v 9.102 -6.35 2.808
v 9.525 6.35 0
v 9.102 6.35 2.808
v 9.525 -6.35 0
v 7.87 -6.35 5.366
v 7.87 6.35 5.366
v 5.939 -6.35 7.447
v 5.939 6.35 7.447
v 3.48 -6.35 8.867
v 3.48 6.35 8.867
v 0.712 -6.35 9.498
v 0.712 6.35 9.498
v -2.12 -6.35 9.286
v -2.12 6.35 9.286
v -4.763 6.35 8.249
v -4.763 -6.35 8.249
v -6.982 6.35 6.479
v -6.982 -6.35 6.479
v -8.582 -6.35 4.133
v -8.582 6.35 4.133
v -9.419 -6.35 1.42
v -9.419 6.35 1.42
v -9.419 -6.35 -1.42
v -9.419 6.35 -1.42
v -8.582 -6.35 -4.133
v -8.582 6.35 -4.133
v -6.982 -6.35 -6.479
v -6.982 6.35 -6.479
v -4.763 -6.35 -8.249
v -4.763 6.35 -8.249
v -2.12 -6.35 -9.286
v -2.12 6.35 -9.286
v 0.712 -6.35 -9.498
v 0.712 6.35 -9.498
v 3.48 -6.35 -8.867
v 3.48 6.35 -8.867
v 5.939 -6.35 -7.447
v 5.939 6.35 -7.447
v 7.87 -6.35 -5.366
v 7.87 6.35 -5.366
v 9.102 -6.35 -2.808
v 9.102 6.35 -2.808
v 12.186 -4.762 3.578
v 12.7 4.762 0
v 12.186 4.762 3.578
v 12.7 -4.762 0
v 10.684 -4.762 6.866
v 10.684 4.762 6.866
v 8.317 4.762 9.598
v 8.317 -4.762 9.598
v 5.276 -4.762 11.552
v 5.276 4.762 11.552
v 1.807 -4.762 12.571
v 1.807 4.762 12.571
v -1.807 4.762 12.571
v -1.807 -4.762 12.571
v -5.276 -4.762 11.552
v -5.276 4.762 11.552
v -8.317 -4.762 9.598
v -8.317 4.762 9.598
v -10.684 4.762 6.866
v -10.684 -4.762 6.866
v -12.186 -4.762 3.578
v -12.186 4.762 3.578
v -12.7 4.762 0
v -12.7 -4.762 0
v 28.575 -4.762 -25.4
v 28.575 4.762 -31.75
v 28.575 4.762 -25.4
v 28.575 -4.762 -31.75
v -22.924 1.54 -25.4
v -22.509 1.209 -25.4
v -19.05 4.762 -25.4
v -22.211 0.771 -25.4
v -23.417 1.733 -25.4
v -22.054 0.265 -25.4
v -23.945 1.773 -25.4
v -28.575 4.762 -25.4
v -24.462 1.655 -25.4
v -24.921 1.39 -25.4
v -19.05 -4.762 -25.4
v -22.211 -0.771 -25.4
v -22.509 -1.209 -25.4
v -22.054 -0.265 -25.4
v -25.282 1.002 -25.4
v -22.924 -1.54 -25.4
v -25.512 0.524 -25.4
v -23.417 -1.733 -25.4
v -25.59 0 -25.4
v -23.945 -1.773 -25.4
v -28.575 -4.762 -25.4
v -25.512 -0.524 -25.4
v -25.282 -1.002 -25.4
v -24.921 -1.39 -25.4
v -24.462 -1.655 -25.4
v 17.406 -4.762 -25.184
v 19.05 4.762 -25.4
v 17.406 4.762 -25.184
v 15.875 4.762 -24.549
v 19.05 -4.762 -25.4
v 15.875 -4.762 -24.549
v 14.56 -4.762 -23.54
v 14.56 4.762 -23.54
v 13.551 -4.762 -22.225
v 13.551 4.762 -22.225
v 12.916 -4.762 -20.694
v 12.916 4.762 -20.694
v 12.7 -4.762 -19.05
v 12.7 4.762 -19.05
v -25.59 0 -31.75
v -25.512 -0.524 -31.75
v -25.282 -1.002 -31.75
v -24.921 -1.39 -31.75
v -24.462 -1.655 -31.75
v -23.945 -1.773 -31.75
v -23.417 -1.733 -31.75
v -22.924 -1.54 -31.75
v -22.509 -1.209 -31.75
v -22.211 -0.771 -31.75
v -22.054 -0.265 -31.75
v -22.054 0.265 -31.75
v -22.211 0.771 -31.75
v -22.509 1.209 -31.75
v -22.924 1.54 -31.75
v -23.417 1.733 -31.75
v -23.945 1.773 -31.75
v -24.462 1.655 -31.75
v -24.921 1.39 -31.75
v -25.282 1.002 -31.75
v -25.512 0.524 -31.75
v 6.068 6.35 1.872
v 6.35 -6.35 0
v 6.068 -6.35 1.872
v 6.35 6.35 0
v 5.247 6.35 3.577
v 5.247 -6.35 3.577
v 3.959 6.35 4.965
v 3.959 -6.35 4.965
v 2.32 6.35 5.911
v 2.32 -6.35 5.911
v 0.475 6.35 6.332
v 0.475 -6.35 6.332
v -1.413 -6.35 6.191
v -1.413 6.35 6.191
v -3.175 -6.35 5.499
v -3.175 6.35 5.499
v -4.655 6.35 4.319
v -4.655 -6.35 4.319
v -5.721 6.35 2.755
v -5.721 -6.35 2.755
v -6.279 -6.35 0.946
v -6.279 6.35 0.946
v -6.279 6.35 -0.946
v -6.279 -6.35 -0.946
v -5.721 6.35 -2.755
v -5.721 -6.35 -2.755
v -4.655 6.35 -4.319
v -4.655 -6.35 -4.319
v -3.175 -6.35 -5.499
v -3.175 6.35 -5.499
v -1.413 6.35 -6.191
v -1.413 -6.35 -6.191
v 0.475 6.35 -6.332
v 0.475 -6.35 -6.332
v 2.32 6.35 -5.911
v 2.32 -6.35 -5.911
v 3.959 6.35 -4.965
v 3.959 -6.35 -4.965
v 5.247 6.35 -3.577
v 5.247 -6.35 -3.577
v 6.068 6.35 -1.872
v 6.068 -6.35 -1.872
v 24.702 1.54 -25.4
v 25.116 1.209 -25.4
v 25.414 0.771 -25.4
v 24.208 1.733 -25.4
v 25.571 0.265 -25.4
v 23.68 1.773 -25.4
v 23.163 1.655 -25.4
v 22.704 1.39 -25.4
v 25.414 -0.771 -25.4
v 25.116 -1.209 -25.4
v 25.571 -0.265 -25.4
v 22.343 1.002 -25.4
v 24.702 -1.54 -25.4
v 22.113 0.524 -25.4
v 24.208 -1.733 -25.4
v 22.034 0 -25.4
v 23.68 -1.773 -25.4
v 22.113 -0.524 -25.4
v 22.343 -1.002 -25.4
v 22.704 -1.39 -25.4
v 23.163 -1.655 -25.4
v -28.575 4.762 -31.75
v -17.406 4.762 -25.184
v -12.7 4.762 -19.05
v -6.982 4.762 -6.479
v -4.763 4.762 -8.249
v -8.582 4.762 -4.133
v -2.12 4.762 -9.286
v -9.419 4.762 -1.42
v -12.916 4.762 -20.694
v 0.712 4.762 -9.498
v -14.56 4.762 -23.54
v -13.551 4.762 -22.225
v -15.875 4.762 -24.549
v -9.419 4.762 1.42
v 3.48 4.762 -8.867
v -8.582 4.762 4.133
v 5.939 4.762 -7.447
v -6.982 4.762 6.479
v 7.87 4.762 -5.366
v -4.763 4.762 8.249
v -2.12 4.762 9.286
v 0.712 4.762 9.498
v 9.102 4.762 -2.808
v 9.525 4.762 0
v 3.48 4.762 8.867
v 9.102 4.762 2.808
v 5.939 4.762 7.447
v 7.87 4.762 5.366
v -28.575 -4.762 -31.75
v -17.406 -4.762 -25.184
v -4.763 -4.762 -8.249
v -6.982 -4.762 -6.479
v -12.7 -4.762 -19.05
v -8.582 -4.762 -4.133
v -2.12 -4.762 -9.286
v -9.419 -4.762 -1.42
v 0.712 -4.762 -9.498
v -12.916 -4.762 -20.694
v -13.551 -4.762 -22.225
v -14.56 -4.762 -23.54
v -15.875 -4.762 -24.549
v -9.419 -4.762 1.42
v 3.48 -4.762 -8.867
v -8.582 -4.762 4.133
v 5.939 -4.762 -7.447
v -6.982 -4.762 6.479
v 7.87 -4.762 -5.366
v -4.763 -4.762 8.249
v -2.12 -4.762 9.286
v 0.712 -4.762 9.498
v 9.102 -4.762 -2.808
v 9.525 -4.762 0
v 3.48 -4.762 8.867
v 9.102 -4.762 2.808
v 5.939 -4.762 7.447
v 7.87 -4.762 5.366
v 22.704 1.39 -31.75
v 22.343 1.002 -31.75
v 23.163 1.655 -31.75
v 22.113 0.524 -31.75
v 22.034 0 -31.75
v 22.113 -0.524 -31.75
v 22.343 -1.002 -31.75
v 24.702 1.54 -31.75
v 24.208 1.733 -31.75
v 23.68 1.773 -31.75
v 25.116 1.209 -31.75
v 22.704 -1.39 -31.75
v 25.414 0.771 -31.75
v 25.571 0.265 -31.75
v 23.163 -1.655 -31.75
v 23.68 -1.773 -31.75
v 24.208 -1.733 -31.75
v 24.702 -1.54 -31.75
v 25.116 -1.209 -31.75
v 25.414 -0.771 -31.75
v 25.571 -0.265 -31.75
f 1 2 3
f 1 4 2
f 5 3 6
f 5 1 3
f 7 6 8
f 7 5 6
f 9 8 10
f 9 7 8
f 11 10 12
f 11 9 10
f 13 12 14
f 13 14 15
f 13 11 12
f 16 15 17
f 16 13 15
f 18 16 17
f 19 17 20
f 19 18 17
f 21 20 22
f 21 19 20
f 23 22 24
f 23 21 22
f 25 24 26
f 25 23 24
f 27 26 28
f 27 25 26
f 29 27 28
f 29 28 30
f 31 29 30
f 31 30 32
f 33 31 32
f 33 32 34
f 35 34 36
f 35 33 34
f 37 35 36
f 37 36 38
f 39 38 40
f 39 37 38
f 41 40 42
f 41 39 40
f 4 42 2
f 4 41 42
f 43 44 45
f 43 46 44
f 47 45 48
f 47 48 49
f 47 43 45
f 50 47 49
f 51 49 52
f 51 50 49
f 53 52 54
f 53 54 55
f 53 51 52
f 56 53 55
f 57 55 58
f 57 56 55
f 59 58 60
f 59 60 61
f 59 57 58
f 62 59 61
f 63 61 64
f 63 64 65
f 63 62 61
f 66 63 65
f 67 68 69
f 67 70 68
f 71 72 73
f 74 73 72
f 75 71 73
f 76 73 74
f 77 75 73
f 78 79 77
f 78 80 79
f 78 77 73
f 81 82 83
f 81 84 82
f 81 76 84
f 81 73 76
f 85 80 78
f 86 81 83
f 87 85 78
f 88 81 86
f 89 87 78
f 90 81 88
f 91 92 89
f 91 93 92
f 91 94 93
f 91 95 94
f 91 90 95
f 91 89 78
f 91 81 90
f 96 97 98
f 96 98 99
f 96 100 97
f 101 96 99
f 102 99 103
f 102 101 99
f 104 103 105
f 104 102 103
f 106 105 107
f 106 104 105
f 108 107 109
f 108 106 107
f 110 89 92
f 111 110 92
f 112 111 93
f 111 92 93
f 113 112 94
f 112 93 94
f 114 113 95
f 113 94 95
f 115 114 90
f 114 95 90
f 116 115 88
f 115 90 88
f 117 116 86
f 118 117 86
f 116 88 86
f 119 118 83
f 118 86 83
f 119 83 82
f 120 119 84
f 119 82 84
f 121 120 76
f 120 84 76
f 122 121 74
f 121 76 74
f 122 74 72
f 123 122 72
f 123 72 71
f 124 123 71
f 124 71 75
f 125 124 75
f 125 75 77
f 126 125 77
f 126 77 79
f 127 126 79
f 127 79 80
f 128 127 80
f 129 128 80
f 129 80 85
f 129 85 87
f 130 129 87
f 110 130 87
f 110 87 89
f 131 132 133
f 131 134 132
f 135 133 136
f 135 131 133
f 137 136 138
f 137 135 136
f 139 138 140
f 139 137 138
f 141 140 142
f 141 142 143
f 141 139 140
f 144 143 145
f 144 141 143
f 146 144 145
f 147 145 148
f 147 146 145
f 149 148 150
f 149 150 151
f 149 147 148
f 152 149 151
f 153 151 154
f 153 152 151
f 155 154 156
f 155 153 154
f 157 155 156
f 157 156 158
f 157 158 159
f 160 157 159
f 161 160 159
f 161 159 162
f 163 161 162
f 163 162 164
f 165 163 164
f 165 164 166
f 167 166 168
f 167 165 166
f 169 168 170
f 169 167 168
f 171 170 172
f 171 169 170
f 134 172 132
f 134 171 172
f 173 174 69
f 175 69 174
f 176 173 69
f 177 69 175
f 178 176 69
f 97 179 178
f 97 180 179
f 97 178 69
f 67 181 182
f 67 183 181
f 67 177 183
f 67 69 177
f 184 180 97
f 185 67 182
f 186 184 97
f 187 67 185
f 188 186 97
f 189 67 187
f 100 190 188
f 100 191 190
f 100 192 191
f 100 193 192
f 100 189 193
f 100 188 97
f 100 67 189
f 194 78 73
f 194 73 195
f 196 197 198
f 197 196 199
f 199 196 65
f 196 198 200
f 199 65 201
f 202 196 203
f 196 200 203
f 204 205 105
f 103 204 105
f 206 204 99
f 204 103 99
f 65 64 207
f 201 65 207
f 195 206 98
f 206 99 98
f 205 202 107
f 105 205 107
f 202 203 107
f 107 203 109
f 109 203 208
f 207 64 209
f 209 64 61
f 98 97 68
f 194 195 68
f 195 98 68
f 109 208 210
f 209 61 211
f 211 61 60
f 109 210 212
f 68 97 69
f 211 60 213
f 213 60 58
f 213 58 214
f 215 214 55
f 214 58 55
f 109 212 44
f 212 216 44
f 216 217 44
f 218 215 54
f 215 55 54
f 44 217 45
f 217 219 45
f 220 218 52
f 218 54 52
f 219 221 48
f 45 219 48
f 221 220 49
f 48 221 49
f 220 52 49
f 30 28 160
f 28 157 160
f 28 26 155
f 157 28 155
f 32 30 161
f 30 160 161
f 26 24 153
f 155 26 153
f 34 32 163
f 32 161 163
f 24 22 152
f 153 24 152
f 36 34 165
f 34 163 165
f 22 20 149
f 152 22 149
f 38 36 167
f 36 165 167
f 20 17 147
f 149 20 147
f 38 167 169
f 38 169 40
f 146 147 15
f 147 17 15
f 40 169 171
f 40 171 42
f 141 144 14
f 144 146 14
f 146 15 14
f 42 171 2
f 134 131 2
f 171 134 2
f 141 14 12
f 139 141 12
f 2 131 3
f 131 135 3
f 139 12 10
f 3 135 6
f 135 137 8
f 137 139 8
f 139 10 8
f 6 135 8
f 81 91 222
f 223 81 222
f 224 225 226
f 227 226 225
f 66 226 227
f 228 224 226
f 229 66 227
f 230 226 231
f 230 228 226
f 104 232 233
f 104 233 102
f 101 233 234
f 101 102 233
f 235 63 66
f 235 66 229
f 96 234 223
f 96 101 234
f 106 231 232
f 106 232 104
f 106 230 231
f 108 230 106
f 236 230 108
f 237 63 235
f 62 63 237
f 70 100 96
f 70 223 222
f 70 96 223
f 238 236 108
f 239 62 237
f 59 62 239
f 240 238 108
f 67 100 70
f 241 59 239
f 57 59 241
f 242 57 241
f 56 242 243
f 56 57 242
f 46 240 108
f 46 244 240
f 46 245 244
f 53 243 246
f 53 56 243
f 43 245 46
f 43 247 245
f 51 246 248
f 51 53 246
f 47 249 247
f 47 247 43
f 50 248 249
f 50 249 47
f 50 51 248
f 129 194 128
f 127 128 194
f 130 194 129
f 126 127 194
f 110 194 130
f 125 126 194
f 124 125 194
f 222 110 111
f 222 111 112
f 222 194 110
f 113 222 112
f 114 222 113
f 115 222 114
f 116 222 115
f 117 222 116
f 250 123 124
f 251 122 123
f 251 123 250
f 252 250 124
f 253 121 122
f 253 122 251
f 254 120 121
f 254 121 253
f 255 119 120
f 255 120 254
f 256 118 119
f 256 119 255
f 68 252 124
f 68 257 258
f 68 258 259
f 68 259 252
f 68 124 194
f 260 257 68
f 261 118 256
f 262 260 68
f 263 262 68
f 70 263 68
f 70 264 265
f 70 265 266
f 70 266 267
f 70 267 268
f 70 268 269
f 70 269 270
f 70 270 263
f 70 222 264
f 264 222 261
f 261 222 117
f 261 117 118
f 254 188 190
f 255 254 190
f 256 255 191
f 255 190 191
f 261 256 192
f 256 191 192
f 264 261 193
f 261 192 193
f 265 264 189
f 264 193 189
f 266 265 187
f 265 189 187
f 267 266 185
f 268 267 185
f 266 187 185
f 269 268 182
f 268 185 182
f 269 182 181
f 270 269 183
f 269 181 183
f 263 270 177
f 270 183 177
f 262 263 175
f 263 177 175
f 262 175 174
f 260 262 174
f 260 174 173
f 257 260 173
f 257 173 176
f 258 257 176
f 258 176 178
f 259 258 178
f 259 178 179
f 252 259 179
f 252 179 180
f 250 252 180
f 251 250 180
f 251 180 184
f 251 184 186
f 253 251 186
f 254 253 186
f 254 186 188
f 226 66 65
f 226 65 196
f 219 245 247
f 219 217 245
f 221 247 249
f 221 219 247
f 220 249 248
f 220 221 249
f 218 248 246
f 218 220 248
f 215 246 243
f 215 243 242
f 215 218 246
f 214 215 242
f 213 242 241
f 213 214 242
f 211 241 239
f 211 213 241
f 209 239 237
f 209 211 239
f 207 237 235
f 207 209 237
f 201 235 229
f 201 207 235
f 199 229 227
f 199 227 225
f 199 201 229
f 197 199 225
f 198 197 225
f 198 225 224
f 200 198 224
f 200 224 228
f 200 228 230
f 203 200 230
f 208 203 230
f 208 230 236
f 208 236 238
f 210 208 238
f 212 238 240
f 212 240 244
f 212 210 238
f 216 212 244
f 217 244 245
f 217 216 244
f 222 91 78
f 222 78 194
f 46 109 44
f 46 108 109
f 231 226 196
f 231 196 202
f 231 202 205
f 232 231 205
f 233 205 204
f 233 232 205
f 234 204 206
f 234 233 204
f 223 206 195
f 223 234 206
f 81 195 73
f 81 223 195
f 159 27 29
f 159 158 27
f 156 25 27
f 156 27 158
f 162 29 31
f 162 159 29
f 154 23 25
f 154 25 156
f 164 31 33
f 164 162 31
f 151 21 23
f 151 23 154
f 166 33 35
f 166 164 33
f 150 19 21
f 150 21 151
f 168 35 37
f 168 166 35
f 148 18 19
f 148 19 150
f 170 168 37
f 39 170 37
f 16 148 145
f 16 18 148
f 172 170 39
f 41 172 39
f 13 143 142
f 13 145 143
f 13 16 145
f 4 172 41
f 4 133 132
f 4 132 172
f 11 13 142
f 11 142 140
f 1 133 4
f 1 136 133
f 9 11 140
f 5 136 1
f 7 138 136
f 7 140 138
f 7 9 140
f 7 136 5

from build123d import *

# Parameters (mm, degrees)
F0_R     = 9.525
F1_DEPTH = 4.7625
F3_D     = 3.556
F4_R     = 9.525
F4_R_2   = 6.35
F5_DEPTH = 6.35


with BuildPart() as f1:
    # F0 (on Front) → F1 (new body, symmetric)
    with BuildSketch(Plane.XZ):
        with BuildLine():
            ThreePointArc((12.7, 0), (0, 12.7), (-12.7, 0))
            Line((-12.7, 0), (-12.7, -19.05))
            ThreePointArc((-12.7, -19.05), (-14.559872, -23.540128), (-19.05, -25.4))
            Line((-19.05, -25.4), (-28.575, -25.4))
            Line((-28.575, -25.4), (-28.575, -31.75))
            Line((-28.575, -31.75), (28.575, -31.75))
            Line((28.575, -31.75), (28.575, -25.4))
            Line((28.575, -25.4), (19.05, -25.4))
            ThreePointArc((19.05, -25.4), (14.559872, -23.540128), (12.7, -19.05))
            Line((12.7, -19.05), (12.7, 0))
        make_face()
        Circle(F0_R, mode=Mode.SUBTRACT)
    extrude(amount=F1_DEPTH, both=True)

    # F3 (through all)
    with Locations(Plane(origin=(0, 0, -31.75), x_dir=(1, 0, 0), z_dir=(0, 0, -1))):
        with Locations((-23.8125, 0), (23.8125, 0)):
            Hole(F3_D / 2)


with BuildPart() as f5:
    # F4 (on Front) → F5 (new body, symmetric)
    with BuildSketch(Plane.XZ):
        Circle(F4_R)
        Circle(F4_R_2, mode=Mode.SUBTRACT)
    extrude(amount=F5_DEPTH, both=True)


solid = Compound([f1.part, f5.part])
